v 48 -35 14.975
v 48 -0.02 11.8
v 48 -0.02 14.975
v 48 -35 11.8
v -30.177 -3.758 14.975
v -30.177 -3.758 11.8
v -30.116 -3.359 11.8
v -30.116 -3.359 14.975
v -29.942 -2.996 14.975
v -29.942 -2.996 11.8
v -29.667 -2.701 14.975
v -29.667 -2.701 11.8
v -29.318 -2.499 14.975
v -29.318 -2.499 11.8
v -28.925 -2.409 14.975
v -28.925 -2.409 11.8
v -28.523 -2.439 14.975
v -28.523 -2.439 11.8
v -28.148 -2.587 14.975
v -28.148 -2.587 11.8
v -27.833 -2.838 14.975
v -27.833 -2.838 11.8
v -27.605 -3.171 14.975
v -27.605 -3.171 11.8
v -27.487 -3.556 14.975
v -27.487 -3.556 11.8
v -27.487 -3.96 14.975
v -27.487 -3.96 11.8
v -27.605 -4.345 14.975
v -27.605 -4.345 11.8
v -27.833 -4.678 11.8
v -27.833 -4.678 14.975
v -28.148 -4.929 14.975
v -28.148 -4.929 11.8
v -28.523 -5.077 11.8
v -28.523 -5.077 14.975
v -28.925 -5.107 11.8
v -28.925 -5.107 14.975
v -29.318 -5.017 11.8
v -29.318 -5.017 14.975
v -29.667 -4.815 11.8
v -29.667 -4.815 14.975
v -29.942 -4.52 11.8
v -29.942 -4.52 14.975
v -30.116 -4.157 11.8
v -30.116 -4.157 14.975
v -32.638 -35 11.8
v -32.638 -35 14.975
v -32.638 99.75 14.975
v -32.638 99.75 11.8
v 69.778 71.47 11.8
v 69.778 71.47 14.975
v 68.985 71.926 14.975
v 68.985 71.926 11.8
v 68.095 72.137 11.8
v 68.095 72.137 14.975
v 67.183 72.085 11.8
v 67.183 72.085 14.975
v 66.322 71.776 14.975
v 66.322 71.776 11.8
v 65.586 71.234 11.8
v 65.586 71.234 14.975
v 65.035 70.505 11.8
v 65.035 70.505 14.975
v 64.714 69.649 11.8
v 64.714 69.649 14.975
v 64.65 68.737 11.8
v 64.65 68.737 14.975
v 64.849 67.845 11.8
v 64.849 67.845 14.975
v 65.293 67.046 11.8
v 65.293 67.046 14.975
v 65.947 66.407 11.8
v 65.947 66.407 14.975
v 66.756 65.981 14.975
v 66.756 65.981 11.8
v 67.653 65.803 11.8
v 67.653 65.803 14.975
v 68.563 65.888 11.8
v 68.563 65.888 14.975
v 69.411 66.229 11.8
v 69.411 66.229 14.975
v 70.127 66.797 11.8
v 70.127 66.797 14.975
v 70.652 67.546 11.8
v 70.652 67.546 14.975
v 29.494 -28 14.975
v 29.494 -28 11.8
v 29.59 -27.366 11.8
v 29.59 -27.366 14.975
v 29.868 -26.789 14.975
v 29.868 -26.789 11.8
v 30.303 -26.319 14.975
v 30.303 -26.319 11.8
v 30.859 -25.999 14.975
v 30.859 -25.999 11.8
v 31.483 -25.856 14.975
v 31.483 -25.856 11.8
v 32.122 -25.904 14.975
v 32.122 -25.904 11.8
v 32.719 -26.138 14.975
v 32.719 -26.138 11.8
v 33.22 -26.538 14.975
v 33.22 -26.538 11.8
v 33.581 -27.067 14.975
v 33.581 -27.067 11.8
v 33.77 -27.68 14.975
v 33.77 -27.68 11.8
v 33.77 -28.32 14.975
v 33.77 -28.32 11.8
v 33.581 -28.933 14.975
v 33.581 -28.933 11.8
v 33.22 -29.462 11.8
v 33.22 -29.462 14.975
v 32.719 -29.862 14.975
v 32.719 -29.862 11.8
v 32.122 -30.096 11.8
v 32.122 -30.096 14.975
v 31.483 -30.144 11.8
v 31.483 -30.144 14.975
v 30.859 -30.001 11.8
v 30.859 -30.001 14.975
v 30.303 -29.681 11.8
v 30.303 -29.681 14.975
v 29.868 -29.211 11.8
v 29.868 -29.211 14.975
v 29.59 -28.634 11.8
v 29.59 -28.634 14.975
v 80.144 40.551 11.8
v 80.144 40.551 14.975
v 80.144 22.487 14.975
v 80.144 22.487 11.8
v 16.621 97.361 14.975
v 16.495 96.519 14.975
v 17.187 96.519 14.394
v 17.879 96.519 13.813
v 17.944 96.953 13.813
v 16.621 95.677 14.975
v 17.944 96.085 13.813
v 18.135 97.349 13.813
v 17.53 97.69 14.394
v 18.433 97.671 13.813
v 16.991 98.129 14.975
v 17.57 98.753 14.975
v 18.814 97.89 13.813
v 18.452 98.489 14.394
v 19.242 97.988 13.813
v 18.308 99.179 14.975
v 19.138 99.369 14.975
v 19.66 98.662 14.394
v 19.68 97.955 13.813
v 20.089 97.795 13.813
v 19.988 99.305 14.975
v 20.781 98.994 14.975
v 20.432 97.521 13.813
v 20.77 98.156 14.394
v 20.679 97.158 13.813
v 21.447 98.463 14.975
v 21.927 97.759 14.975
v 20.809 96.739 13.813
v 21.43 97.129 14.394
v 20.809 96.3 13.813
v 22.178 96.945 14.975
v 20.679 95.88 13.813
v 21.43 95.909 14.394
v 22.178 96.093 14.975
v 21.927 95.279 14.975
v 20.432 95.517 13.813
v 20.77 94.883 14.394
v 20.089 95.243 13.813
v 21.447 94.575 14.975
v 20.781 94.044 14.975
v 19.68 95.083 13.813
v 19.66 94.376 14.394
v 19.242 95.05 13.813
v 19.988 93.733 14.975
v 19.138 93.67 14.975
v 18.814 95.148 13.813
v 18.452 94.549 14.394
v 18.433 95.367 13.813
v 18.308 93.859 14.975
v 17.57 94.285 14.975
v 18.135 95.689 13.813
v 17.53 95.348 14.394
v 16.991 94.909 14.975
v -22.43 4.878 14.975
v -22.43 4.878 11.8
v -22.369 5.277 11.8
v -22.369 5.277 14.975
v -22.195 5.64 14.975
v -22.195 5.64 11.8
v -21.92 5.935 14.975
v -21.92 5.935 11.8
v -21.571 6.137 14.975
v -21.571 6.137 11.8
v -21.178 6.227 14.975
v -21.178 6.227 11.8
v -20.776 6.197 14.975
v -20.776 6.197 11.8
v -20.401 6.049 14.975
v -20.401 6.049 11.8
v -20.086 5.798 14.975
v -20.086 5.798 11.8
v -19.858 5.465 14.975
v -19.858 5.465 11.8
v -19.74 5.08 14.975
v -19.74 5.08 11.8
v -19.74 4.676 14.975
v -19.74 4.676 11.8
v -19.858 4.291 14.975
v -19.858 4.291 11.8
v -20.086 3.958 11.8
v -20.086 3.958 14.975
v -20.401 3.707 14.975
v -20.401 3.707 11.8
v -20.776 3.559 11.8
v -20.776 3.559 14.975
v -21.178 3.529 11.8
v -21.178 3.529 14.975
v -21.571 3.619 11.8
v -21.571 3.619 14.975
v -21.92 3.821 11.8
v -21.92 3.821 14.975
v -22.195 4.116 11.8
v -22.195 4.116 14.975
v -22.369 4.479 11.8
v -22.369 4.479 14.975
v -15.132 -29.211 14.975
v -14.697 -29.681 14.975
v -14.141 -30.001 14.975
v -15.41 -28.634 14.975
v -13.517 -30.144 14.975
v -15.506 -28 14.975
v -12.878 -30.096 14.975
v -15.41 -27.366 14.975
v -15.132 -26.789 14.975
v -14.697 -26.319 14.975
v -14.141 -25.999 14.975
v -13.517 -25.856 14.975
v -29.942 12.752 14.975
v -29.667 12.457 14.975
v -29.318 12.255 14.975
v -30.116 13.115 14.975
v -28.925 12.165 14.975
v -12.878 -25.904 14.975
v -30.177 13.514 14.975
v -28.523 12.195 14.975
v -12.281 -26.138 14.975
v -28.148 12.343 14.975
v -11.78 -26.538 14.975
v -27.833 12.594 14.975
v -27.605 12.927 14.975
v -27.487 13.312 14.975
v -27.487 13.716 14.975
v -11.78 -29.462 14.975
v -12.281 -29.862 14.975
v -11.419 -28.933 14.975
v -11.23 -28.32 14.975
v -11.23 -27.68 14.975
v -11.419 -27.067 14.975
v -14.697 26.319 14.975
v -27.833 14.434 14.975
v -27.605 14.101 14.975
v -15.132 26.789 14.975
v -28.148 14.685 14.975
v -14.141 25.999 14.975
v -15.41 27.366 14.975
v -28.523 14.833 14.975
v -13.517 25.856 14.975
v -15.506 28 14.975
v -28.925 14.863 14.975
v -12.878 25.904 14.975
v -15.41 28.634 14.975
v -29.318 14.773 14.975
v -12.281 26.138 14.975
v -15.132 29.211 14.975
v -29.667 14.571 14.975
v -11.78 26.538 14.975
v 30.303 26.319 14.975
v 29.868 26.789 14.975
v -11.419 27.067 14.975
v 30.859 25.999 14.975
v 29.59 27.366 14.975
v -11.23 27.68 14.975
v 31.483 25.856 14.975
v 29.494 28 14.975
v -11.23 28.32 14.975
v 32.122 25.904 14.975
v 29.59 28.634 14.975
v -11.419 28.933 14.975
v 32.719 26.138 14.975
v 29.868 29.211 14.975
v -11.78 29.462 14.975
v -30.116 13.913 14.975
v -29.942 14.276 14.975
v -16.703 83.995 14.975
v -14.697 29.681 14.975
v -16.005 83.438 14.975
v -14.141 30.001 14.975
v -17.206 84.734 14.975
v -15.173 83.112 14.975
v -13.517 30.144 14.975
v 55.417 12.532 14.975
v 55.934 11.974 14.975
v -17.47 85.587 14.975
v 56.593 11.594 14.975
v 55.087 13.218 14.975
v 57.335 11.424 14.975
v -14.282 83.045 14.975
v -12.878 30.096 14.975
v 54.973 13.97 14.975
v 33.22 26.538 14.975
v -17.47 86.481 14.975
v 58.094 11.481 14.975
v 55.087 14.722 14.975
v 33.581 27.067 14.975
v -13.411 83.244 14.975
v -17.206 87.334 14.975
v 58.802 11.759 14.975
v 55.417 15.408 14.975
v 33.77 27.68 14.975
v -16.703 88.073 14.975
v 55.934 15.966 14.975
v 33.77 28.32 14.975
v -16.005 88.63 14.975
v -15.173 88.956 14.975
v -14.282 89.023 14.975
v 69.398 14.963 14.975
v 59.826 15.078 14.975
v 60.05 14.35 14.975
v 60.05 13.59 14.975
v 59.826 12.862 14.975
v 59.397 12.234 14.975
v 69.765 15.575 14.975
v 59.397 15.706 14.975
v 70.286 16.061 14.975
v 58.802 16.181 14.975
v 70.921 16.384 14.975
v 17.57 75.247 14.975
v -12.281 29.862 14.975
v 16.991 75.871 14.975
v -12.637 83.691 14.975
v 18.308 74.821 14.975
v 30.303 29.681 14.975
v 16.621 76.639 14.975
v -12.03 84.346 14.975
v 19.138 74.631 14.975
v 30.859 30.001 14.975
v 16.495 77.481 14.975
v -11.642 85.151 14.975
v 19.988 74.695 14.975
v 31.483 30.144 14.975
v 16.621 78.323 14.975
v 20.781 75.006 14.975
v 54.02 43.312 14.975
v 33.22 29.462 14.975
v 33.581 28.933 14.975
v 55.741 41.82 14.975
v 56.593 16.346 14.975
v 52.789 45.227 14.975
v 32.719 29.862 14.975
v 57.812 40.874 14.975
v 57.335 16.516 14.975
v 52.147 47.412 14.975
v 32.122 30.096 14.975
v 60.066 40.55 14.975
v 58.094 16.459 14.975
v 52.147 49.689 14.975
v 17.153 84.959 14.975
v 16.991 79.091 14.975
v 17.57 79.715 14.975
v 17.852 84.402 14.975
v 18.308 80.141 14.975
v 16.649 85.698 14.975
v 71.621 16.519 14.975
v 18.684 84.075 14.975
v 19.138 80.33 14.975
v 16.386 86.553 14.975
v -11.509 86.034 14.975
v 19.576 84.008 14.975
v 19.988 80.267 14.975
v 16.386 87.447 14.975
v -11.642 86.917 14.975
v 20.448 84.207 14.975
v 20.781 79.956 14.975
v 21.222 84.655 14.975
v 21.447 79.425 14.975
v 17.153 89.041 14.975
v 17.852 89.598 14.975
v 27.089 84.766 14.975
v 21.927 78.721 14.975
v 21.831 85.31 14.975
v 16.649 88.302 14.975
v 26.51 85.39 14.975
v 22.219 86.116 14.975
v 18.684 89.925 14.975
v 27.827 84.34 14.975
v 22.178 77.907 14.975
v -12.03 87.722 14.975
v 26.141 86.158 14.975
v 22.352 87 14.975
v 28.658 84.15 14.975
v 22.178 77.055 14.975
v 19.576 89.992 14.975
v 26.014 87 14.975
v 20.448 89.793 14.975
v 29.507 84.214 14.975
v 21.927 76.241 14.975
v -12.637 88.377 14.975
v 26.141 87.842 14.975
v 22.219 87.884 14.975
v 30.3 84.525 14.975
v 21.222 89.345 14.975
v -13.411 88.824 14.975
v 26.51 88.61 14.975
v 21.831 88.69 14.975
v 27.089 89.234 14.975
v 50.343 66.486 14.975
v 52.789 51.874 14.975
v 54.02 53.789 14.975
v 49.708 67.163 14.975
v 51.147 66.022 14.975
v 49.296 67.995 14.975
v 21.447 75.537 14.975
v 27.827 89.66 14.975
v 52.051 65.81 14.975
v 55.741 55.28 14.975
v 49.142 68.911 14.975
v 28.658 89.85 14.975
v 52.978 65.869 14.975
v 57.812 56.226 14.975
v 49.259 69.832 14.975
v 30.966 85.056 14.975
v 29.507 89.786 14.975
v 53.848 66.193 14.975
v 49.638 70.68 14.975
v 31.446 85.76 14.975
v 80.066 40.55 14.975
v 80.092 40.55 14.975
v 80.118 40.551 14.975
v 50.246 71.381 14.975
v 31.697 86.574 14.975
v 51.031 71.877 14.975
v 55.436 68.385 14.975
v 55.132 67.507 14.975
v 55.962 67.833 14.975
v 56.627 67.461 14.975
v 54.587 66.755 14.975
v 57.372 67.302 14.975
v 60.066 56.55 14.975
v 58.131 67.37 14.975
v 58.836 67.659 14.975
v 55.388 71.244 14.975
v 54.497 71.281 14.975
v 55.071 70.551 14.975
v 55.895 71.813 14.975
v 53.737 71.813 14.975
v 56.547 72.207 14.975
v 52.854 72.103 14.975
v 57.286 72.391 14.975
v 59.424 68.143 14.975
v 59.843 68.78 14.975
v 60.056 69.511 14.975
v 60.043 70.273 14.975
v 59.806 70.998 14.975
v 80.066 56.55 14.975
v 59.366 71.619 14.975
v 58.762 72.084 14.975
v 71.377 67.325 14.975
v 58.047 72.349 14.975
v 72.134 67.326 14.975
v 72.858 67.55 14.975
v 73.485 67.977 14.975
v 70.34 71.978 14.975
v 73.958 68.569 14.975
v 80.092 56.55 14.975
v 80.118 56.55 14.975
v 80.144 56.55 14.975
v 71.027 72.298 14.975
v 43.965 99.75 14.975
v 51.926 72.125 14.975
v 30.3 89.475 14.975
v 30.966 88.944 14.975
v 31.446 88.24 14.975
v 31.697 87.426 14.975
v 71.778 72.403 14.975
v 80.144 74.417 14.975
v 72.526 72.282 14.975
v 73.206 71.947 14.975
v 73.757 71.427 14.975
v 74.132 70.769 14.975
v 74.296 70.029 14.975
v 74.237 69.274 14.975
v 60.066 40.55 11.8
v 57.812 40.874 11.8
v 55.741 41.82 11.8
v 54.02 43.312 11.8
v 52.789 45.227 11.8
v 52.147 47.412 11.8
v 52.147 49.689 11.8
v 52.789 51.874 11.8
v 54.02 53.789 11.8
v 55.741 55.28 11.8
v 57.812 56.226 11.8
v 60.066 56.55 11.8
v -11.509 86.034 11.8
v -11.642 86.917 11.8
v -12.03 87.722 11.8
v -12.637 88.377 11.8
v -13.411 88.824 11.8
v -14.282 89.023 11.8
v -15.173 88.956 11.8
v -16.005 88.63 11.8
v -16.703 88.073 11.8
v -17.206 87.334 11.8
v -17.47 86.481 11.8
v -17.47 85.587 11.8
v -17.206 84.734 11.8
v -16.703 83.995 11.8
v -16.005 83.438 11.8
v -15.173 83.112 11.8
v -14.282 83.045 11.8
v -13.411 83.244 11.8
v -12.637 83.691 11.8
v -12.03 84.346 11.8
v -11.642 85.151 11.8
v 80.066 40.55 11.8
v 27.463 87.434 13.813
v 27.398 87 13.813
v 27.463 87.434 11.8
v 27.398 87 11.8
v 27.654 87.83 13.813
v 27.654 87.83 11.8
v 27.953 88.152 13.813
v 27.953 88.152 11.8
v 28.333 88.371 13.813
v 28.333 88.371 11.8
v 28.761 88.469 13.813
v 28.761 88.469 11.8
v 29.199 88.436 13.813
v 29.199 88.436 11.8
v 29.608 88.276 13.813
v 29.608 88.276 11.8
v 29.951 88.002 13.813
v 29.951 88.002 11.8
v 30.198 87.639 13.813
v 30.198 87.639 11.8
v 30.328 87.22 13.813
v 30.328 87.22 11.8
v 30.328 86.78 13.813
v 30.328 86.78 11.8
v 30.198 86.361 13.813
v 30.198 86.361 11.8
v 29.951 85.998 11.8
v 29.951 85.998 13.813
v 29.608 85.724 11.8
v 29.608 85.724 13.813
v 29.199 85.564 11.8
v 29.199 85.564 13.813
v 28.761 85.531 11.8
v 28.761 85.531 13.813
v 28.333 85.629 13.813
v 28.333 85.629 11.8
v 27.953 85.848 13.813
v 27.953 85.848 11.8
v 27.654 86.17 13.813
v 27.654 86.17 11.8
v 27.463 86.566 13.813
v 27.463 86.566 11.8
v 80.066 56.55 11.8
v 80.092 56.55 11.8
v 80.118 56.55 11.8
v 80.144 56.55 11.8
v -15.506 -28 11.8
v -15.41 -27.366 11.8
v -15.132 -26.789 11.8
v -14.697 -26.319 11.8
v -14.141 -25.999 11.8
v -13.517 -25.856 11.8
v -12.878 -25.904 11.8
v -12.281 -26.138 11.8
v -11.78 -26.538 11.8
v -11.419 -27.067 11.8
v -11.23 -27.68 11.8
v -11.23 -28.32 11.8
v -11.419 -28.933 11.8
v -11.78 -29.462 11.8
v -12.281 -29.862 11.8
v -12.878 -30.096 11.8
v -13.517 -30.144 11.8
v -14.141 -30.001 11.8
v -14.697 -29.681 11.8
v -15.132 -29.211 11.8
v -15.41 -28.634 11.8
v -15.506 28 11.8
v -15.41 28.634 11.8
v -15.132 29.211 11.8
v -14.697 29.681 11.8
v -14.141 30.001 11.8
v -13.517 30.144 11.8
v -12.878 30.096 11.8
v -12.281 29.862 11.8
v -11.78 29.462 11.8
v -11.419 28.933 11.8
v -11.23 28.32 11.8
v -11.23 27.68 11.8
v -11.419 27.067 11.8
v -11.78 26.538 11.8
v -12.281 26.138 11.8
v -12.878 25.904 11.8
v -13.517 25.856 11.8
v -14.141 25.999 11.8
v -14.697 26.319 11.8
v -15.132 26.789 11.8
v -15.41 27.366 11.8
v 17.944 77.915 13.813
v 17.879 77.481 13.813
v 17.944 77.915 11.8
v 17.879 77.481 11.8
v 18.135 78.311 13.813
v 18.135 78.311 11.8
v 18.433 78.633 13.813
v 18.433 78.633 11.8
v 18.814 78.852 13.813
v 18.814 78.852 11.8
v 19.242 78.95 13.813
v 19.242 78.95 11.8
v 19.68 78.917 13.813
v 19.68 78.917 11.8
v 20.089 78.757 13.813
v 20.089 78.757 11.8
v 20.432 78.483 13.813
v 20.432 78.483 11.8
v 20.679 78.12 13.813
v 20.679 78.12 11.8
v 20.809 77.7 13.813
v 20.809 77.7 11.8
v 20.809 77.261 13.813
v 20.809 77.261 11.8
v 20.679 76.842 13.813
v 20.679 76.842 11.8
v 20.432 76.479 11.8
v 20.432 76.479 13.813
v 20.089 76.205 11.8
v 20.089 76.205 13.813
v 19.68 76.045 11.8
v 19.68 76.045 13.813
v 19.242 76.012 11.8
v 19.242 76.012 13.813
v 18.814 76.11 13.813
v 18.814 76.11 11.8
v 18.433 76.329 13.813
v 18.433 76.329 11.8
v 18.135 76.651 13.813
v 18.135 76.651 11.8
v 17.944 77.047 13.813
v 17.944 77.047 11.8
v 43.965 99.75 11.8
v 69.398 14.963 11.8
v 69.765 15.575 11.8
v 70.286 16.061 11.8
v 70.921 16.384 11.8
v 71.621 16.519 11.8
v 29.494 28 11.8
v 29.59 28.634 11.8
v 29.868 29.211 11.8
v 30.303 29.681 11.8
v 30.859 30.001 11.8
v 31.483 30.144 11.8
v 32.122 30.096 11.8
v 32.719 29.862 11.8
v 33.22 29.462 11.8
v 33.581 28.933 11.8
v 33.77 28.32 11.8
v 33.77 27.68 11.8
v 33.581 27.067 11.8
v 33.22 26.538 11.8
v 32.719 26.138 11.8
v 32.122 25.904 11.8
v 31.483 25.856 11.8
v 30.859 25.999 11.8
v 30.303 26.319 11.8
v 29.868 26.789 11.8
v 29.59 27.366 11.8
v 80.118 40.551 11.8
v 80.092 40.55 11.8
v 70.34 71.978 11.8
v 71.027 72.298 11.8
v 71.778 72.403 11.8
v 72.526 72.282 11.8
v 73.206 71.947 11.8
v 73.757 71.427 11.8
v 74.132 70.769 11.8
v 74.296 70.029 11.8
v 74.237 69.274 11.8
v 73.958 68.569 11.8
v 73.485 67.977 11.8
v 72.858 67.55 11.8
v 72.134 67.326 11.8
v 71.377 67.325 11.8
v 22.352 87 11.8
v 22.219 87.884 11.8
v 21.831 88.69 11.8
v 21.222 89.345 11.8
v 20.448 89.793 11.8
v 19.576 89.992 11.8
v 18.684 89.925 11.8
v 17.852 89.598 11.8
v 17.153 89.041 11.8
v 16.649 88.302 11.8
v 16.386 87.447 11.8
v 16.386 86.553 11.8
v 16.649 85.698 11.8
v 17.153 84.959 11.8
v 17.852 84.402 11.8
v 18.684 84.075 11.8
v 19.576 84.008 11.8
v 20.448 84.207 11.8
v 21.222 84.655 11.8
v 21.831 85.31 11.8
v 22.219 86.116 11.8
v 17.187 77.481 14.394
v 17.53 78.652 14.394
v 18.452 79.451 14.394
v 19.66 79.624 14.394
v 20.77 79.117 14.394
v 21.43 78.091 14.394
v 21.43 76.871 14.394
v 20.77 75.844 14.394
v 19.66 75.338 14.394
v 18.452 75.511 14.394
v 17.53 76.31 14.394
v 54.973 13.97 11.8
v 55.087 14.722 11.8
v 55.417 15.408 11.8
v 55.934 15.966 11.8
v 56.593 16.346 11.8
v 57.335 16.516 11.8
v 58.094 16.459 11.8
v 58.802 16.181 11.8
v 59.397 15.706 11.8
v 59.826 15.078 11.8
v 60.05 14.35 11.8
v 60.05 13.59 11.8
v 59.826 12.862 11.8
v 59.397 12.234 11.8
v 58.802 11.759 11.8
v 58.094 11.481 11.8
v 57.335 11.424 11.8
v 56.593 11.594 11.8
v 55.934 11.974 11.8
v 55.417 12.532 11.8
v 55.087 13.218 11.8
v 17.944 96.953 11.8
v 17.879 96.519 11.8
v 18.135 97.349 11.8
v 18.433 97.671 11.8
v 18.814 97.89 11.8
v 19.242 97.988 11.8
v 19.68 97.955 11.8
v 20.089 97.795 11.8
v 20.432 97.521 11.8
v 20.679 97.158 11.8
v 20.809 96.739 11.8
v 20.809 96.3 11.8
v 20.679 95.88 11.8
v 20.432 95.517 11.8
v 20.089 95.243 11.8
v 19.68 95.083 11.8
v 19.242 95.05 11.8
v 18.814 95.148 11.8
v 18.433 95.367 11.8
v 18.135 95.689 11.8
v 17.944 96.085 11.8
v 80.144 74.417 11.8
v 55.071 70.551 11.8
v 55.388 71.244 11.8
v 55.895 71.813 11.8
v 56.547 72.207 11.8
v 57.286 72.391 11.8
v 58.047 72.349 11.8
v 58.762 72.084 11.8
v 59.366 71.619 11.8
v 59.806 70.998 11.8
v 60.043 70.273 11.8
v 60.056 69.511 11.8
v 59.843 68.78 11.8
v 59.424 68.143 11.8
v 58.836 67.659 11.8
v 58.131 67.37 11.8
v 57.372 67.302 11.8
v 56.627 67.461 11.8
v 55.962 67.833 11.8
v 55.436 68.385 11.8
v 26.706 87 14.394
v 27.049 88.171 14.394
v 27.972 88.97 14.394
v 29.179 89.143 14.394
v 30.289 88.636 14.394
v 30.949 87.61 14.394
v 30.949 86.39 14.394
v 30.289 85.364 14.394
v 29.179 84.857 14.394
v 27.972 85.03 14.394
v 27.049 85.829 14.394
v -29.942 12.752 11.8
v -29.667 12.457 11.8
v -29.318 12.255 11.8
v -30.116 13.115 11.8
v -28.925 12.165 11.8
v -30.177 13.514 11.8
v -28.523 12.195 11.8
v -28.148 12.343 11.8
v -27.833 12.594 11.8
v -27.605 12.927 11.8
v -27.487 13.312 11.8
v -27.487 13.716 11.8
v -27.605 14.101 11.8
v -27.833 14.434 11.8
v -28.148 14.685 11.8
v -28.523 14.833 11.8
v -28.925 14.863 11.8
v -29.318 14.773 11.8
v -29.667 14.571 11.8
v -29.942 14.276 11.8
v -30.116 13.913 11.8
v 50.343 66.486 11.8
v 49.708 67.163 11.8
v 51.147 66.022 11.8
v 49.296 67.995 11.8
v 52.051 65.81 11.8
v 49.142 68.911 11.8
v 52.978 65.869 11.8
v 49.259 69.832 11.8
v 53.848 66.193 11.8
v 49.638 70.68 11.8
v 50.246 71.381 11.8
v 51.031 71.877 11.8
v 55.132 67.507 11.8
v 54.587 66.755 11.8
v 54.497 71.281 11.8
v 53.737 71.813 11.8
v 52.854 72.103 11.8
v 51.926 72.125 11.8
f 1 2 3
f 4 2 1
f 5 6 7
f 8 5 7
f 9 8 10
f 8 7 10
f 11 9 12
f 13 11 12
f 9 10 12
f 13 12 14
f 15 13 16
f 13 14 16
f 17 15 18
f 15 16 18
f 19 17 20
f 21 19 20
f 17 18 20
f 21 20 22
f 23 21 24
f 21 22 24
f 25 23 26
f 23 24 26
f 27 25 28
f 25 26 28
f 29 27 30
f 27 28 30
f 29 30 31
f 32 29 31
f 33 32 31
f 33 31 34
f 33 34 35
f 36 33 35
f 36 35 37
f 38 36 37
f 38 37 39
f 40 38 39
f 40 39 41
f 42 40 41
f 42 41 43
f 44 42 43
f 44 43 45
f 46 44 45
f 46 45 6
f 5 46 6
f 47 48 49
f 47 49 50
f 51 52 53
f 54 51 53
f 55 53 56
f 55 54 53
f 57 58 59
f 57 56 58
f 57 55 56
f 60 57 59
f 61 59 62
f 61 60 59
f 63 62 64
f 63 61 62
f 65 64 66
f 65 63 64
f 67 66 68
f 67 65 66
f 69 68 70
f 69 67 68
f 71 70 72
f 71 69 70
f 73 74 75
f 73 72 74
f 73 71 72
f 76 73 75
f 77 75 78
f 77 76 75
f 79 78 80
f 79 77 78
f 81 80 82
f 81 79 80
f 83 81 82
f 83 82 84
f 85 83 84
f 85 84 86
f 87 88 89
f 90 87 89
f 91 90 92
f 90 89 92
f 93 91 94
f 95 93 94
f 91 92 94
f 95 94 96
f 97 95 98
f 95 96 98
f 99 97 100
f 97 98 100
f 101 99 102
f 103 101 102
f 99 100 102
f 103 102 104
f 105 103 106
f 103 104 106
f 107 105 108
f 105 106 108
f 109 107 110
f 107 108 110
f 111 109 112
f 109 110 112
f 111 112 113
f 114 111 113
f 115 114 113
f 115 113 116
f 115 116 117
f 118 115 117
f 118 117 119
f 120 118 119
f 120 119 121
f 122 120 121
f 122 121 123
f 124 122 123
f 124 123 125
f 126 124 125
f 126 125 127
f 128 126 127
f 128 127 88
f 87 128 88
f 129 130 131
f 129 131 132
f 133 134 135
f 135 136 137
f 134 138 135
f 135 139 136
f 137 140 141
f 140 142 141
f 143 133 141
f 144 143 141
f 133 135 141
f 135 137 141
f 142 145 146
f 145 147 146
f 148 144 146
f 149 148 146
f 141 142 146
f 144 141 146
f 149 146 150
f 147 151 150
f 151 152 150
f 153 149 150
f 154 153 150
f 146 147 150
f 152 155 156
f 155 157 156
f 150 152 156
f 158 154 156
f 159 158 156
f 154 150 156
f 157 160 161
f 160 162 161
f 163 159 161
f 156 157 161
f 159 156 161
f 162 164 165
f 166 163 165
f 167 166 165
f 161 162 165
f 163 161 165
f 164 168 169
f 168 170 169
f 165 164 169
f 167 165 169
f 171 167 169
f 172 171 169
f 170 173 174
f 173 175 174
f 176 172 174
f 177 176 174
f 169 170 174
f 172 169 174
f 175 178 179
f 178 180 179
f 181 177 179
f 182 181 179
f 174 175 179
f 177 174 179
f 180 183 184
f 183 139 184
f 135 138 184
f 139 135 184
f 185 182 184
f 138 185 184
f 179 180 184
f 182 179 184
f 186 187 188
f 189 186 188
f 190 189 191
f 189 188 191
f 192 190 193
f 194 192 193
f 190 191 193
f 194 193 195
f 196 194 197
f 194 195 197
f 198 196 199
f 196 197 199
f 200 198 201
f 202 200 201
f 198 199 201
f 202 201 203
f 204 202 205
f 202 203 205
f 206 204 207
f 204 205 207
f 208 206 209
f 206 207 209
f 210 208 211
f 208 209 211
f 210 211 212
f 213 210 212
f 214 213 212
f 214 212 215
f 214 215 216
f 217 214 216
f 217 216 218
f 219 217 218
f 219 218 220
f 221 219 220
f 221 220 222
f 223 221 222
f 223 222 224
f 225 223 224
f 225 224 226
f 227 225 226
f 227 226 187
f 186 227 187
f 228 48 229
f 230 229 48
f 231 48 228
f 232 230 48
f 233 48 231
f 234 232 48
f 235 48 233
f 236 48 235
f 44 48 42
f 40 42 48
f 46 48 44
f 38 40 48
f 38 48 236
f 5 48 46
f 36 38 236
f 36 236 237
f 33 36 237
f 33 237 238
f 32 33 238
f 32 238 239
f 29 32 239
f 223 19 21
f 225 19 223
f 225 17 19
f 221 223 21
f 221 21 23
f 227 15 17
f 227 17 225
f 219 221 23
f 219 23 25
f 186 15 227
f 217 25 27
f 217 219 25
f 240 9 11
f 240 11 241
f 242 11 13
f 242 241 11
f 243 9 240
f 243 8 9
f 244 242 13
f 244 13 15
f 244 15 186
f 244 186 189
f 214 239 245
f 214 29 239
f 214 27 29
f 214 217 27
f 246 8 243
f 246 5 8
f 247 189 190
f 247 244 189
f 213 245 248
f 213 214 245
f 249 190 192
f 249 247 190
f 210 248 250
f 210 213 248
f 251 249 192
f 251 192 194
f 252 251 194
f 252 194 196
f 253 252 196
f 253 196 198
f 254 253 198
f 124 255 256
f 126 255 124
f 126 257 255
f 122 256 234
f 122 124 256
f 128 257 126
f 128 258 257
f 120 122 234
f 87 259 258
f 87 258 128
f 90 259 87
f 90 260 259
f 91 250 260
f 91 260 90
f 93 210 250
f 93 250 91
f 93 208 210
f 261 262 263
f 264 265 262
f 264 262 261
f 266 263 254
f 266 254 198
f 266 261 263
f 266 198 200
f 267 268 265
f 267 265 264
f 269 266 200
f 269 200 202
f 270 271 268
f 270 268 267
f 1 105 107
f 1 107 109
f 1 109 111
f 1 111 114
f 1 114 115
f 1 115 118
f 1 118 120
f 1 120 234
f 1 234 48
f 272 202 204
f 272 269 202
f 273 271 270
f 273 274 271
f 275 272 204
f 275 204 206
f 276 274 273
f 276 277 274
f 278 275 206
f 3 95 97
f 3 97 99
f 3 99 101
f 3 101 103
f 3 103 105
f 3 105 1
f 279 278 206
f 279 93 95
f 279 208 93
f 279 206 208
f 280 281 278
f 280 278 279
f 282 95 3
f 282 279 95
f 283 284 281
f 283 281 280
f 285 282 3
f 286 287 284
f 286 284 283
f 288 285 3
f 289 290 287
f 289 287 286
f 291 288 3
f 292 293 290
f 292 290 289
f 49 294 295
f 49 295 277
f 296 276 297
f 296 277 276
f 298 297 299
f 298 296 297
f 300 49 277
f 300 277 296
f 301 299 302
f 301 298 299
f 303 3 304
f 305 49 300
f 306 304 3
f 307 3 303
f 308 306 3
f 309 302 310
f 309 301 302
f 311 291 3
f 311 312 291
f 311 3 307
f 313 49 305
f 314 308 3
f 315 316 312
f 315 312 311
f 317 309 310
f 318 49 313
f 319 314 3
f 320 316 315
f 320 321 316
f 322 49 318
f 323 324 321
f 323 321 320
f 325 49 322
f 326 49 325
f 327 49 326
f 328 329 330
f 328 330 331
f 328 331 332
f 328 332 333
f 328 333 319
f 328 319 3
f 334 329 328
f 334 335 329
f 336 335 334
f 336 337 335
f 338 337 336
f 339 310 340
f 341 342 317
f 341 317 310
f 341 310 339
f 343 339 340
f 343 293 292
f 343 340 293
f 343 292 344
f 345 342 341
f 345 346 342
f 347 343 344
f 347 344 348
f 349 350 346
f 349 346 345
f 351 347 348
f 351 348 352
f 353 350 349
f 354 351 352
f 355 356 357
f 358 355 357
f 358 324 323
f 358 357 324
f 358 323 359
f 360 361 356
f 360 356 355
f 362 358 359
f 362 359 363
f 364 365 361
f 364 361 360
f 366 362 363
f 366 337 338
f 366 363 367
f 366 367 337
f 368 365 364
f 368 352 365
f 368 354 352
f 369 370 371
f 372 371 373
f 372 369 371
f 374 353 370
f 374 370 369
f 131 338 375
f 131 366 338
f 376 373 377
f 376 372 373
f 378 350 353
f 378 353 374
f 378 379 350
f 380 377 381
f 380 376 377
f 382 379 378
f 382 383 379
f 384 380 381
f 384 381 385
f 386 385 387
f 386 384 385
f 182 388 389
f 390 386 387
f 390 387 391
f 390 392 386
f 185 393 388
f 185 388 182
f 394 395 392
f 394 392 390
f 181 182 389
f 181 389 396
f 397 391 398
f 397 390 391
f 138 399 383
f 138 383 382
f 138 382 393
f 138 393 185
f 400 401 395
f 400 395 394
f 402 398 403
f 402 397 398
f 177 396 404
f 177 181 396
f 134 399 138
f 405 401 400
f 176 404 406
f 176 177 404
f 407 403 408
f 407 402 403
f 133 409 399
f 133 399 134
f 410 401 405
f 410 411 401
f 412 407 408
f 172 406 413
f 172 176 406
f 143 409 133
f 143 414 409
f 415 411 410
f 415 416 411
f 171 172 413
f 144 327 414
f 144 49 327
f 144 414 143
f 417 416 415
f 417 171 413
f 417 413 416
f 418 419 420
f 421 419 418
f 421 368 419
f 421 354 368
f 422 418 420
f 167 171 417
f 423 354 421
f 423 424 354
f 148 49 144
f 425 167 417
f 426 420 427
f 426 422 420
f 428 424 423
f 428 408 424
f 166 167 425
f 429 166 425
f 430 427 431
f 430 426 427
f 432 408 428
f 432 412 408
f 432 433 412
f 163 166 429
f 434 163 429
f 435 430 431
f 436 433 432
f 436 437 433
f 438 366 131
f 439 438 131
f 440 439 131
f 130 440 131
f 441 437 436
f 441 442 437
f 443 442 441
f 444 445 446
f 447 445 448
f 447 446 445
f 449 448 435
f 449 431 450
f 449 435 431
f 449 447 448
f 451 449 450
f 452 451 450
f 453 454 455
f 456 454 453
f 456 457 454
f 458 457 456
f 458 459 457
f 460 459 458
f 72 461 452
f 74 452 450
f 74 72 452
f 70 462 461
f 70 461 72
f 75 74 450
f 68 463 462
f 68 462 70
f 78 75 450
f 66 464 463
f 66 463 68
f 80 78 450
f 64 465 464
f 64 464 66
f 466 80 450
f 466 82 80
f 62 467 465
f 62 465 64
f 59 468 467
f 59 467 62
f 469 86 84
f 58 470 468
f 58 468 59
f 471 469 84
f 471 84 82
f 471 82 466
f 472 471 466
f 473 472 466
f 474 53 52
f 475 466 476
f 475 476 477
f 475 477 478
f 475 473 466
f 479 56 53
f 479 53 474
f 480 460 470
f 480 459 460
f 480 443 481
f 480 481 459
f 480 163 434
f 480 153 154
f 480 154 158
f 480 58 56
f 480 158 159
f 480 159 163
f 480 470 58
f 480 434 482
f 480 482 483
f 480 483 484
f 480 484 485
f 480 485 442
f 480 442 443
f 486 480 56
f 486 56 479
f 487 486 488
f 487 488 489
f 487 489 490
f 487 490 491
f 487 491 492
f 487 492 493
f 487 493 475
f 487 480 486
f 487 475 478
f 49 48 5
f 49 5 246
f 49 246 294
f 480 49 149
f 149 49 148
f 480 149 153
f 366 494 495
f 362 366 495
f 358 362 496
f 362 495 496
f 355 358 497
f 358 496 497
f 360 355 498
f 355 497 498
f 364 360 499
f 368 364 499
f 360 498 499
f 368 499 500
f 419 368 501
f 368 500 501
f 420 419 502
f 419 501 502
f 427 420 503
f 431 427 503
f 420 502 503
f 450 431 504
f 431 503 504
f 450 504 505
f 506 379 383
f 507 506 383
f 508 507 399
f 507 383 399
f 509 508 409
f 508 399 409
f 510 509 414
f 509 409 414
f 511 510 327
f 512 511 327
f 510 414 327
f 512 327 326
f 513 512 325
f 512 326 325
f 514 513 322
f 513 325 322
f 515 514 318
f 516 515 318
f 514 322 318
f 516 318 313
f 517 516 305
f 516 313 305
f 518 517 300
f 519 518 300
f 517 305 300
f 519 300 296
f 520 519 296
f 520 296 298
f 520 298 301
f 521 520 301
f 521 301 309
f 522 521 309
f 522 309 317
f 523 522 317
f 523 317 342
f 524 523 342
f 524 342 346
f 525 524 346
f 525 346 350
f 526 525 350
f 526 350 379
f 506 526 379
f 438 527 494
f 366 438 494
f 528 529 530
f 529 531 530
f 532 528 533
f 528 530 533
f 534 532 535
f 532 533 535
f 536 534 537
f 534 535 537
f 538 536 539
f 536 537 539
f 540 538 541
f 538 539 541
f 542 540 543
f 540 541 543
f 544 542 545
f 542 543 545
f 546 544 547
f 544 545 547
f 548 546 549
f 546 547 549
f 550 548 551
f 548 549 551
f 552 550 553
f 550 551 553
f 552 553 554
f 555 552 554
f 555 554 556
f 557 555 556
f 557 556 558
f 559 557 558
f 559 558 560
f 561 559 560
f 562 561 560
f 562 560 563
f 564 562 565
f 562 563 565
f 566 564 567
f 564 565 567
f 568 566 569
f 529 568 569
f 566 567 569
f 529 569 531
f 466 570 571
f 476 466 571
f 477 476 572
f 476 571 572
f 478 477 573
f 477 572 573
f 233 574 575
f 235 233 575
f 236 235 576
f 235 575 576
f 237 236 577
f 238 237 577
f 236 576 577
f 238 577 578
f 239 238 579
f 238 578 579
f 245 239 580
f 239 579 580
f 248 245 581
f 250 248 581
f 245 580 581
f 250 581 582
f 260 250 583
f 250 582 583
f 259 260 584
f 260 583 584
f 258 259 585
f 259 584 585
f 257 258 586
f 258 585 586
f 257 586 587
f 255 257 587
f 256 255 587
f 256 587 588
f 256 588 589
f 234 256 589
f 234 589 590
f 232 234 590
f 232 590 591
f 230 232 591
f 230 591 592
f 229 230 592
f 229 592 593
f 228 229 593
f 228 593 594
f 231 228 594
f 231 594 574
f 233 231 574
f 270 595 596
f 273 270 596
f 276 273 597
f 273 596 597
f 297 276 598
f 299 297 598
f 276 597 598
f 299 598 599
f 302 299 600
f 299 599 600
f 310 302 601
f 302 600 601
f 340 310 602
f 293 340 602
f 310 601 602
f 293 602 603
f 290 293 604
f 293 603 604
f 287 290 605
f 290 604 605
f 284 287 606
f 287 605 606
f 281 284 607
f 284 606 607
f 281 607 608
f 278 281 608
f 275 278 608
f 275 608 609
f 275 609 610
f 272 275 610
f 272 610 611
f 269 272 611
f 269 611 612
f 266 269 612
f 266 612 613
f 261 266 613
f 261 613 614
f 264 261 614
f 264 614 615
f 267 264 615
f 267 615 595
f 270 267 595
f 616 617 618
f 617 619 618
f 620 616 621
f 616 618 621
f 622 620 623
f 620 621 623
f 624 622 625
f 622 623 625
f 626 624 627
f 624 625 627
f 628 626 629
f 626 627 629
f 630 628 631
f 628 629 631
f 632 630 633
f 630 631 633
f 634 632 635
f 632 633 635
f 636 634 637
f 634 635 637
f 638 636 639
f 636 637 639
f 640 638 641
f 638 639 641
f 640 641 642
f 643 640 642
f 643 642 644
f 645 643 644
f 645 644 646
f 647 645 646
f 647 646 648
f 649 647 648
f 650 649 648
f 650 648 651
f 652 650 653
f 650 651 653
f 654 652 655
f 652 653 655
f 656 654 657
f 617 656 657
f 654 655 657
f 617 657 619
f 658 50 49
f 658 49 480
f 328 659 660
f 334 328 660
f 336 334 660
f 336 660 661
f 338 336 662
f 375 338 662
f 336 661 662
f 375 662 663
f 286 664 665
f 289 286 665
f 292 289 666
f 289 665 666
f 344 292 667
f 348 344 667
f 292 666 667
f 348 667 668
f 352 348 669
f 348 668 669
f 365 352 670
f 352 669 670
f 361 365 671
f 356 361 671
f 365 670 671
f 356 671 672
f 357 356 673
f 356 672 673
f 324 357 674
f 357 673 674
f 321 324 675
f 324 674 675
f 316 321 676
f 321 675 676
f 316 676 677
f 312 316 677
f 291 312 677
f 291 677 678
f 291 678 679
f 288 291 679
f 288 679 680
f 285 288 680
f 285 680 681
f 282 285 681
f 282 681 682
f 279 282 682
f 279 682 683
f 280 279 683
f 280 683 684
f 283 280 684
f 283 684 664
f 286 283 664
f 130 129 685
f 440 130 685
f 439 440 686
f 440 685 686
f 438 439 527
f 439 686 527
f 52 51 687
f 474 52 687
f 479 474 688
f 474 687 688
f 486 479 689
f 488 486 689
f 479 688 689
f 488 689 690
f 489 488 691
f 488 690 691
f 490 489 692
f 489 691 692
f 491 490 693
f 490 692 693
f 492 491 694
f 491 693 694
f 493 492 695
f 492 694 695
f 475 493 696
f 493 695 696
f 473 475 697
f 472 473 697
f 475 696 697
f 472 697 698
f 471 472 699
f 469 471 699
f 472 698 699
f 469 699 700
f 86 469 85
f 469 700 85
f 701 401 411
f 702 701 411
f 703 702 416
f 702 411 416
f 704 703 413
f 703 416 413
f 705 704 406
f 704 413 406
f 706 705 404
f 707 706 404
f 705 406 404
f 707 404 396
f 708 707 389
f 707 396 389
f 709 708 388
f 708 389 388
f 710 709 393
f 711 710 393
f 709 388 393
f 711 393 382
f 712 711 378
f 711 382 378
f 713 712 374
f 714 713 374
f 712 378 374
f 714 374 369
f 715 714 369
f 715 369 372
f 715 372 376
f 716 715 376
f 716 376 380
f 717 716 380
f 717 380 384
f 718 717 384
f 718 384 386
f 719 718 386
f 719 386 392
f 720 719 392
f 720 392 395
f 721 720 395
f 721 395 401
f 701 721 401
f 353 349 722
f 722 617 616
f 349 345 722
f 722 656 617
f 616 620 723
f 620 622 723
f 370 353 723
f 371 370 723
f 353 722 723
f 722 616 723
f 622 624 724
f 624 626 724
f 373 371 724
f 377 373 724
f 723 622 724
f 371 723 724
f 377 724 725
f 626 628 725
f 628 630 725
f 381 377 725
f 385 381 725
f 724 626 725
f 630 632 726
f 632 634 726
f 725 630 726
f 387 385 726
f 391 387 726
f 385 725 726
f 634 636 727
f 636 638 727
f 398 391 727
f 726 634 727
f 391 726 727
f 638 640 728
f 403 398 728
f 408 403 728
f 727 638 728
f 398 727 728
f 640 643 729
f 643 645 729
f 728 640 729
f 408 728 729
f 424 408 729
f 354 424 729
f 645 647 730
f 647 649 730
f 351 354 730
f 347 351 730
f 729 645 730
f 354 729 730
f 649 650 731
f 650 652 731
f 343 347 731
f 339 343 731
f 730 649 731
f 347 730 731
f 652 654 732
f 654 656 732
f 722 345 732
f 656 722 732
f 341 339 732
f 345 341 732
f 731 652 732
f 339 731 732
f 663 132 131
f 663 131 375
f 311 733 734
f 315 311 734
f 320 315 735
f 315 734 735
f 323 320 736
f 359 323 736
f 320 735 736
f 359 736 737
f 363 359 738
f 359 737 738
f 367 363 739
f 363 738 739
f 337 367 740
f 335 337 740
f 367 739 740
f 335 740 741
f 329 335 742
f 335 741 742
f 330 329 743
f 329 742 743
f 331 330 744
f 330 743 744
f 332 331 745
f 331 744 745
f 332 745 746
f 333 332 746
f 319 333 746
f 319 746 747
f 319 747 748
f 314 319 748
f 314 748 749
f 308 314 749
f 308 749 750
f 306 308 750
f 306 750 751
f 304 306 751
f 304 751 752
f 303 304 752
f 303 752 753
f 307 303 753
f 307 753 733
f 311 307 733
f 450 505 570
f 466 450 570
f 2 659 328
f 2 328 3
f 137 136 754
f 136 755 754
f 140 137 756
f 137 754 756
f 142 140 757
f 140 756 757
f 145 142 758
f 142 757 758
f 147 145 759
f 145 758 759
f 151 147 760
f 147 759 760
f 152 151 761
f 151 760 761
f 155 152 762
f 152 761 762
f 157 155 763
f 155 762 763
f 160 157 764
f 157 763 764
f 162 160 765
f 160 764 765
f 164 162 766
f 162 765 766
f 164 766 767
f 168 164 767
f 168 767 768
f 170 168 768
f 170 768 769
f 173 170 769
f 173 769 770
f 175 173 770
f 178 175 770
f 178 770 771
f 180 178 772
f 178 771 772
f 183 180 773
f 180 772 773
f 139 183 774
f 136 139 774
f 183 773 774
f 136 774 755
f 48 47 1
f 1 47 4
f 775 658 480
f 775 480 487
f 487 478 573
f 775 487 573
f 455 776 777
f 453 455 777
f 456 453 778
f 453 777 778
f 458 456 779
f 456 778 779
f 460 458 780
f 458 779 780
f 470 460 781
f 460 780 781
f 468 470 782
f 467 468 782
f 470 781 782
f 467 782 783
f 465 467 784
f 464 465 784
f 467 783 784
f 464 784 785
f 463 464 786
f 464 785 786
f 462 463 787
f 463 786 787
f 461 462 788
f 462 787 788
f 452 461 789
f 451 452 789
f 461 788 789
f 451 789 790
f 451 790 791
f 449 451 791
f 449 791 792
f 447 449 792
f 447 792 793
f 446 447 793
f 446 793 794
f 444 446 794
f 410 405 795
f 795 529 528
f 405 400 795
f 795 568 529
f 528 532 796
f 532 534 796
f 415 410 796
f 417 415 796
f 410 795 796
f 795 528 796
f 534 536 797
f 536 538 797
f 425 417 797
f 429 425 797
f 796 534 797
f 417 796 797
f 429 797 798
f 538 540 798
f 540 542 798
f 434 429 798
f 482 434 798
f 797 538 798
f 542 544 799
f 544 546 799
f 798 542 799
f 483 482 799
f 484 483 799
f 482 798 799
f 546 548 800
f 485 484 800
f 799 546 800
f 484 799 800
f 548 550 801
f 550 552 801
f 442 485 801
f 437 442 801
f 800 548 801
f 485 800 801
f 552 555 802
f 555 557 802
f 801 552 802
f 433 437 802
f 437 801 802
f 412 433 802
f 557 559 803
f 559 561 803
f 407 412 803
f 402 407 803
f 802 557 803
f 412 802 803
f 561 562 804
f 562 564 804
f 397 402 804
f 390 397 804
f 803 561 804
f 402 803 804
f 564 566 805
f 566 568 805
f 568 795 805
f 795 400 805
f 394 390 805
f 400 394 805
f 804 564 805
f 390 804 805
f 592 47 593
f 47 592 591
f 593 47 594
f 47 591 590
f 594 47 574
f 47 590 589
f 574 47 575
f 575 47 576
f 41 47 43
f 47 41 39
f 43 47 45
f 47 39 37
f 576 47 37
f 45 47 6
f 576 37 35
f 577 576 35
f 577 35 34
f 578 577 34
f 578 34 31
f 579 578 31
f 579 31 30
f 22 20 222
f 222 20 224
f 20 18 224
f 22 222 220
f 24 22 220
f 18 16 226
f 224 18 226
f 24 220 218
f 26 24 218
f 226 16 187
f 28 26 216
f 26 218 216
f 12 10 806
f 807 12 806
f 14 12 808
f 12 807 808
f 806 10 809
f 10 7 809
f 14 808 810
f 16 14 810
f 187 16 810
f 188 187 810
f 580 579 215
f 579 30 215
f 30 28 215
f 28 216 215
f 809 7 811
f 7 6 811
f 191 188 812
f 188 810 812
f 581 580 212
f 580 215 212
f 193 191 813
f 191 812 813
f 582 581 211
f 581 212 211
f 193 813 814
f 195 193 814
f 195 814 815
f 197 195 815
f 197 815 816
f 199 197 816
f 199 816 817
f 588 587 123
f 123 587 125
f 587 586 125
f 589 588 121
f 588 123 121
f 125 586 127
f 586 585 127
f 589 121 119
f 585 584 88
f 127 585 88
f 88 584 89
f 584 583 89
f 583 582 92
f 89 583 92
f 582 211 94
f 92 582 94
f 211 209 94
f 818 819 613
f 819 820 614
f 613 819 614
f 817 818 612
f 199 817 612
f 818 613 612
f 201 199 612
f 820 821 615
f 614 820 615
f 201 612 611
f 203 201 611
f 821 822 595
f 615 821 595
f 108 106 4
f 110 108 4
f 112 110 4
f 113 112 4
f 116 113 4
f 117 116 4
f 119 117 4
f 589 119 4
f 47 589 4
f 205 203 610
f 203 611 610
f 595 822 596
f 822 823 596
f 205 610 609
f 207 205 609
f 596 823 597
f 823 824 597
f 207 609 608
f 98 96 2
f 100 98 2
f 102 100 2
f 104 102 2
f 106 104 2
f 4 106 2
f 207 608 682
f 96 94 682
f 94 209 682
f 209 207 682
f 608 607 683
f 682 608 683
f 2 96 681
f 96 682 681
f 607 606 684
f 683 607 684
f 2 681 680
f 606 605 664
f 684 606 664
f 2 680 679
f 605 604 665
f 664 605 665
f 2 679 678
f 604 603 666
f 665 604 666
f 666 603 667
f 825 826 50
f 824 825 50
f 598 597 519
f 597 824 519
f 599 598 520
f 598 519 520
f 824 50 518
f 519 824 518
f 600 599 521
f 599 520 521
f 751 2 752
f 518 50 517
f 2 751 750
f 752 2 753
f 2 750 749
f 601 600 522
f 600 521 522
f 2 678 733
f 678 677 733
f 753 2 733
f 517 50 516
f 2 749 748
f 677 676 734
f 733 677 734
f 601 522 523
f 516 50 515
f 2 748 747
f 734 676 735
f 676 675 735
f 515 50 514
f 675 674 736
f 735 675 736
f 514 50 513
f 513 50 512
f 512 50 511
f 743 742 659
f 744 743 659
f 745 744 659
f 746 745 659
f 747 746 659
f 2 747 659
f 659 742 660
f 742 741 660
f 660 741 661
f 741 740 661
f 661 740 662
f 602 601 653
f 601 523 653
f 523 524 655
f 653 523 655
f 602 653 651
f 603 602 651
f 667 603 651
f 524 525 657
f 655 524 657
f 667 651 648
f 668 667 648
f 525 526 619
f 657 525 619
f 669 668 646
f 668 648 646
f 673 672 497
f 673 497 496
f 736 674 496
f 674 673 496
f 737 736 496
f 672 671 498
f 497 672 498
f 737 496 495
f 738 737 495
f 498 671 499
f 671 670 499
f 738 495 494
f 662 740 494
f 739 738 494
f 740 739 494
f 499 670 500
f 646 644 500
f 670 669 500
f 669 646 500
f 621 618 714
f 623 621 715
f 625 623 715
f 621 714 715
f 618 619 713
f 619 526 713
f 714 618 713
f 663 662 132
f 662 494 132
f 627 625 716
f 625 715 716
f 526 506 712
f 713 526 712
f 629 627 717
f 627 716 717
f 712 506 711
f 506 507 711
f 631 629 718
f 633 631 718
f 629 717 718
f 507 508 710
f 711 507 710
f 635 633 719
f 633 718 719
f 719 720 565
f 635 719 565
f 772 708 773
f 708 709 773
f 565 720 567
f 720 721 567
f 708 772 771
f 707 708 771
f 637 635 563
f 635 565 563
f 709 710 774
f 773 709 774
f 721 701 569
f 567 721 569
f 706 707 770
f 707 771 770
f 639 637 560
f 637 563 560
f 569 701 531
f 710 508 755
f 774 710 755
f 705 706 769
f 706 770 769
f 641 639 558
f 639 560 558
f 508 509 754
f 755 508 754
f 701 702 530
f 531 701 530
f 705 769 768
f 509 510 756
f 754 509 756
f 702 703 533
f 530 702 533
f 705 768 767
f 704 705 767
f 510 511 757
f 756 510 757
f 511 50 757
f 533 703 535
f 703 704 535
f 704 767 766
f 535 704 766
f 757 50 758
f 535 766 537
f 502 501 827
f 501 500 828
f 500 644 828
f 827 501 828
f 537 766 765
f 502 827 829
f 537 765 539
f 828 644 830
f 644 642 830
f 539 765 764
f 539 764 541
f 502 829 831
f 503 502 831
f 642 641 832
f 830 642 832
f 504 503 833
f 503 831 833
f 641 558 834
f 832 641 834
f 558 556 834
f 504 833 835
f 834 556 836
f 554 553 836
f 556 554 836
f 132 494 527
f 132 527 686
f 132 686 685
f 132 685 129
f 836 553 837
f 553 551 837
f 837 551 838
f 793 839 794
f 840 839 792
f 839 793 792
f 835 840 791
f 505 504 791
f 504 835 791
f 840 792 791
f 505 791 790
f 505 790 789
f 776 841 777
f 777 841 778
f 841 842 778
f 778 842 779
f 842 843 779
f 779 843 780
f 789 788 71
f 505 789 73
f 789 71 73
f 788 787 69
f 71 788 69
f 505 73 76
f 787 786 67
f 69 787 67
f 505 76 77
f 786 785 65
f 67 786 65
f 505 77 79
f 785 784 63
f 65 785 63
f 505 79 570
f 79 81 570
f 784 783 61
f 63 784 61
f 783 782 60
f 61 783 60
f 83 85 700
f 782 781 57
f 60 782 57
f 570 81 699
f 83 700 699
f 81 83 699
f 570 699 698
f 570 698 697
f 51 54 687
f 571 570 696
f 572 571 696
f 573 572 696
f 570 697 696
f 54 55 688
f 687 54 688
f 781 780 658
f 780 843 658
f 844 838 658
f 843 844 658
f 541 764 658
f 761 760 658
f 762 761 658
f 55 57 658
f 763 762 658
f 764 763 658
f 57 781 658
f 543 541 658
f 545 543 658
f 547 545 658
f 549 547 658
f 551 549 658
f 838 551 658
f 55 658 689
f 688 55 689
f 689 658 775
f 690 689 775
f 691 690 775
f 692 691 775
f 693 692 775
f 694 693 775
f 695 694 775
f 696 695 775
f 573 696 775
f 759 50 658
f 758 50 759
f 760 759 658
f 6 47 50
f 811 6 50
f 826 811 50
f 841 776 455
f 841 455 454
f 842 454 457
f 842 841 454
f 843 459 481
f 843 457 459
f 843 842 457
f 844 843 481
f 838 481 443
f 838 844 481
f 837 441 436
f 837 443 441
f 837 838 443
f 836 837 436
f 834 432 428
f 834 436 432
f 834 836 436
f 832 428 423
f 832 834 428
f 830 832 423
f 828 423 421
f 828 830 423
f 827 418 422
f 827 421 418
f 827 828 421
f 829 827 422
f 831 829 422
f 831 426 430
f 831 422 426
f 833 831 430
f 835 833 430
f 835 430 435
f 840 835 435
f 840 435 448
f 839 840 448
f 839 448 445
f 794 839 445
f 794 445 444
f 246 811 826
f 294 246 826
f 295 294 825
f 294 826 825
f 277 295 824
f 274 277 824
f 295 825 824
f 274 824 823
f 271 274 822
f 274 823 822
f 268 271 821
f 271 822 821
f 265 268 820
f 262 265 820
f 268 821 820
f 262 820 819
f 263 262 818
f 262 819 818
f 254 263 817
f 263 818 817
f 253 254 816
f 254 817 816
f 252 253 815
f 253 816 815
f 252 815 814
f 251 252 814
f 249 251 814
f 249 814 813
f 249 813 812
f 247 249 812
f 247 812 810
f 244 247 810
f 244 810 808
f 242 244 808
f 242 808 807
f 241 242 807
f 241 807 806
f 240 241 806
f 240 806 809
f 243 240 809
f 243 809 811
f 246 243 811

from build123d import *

# Parameters (mm, degrees)
SKETCH1_W                                         = 112.782
SKETCH1_H                                         = 3.175
BOSS_EXTRUDE1_DEPTH                               = 99.75
BOSS_EXTRUDE1_DEPTH_BACK                          = 35
SKETCH2_R                                         = 3.175
CUT_EXTRUDE1_DEPTH                                = 15.975
CUT_EXTRUDE1_DEPTH_BACK                           = 1
M4_CLEARANCE_HOLE1_D                              = 4.3
CSK_FOR_4_FLAT_HEAD_MACHINE_SCREW_100_D           = 2.9464
CSK_FOR_4_FLAT_HEAD_MACHINE_SCREW_100_CSINK_D     = 5.715
CSK_FOR_4_FLAT_HEAD_MACHINE_SCREW_100_CSINK_ANGLE = 100
SKETCH8_R                                         = 3
CUT_EXTRUDE3_DEPTH                                = 3.5
F_6_32_TAPPED_HOLE1_D                             = 2.7051
F_1_4_20_TAPPED_HOLE1_D                           = 5.1054
SKETCH16_R                                        = 2.9972
CUT_EXTRUDE4_DEPTH                                = 4.175


with BuildPart() as part:
    # Sketch1 → Boss-Extrude1 (new body, two sides)
    with BuildSketch(Plane(origin=(0, 0, 0), x_dir=(1, 0, 0), z_dir=(0, 1, 0))) as boss_extrude1_sk:
        with Locations((23.753, -13.3875)):
            Rectangle(SKETCH1_W, SKETCH1_H)
    extrude(amount=BOSS_EXTRUDE1_DEPTH)
    extrude(boss_extrude1_sk.sketch, amount=-BOSS_EXTRUDE1_DEPTH_BACK)

    # Sketch2 → Cut-Extrude1 (cut, two sides)
    with BuildSketch(Plane.XY) as cut_extrude1_sk:
        with Locations((67.816, 68.973813735)):
            Circle(SKETCH2_R)
        with Locations((52.316, 68.973813735)):
            Circle(SKETCH2_R)
        Polygon((48, -35), (80.144, -35), (80.144, 22.487287802), (48, -0.020183306), align=None)
        with BuildLine():
            Line((60.066, 56.550419976), (80.066, 56.550419976))
            ThreePointArc((80.066, 56.550419976), (88.066, 48.550419976), (80.066, 40.550419976))
            Line((80.066, 40.550419976), (60.066, 40.550419976))
            ThreePointArc((60.066, 40.550419976), (52.066, 48.550419976), (60.066, 56.550419976))
        make_face()
        Polygon((43.964687276, 99.75), (80.144, 74.416972504), (80.144, 99.75), align=None)
    extrude(amount=CUT_EXTRUDE1_DEPTH, mode=Mode.SUBTRACT)
    extrude(cut_extrude1_sk.sketch, amount=-CUT_EXTRUDE1_DEPTH_BACK, mode=Mode.SUBTRACT)

    # M4 Clearance Hole1 (through all)
    with Locations(Plane.XY.offset(14.975)):
        with Locations((-13.356, 28), (31.644, 28), (31.644, -28), (-13.356, -28)):
            Hole(M4_CLEARANCE_HOLE1_D / 2)

    # CSK for #4 Flat Head Machine Screw (100)1 (through all)
    with Locations(Plane.XY.offset(14.975)):
        with Locations((19.352, 96.519071488), (28.871071488, 87), (19.352, 77.480928512)):
            CounterSinkHole(CSK_FOR_4_FLAT_HEAD_MACHINE_SCREW_100_D / 2, CSK_FOR_4_FLAT_HEAD_MACHINE_SCREW_100_CSINK_D / 2, counter_sink_angle=CSK_FOR_4_FLAT_HEAD_MACHINE_SCREW_100_CSINK_ANGLE)

    # Sketch8 → Cut-Extrude3 (cut)
    with BuildSketch(Plane.XY.offset(14.975)):
        with Locations((19.352, 87)):
            Circle(SKETCH8_R)
    extrude(amount=-CUT_EXTRUDE3_DEPTH, mode=Mode.SUBTRACT)

    # #6-32 Tapped Hole1 (through all)
    with Locations(Plane.XY.offset(14.975)):
        with Locations((-28.824, -3.758), (-21.077, 4.878), (-28.824, 13.514)):
            Hole(F_6_32_TAPPED_HOLE1_D / 2)

    # 1/4-20 Tapped Hole1 (through all)
    with Locations(Plane.XY.offset(14.975)):
        with Locations((57.526, 13.97), (71.75, 13.97), (71.75, 69.85), (57.526, 69.85)):
            Hole(F_1_4_20_TAPPED_HOLE1_D / 2)

    # Sketch16 → Cut-Extrude4 (cut, through all)
    with BuildSketch(Plane.XY.offset(14.975)):
        with Locations((-14.5061, 86.034)):
            Circle(SKETCH16_R)
    extrude(amount=-CUT_EXTRUDE4_DEPTH, mode=Mode.SUBTRACT)


solid = part.part
